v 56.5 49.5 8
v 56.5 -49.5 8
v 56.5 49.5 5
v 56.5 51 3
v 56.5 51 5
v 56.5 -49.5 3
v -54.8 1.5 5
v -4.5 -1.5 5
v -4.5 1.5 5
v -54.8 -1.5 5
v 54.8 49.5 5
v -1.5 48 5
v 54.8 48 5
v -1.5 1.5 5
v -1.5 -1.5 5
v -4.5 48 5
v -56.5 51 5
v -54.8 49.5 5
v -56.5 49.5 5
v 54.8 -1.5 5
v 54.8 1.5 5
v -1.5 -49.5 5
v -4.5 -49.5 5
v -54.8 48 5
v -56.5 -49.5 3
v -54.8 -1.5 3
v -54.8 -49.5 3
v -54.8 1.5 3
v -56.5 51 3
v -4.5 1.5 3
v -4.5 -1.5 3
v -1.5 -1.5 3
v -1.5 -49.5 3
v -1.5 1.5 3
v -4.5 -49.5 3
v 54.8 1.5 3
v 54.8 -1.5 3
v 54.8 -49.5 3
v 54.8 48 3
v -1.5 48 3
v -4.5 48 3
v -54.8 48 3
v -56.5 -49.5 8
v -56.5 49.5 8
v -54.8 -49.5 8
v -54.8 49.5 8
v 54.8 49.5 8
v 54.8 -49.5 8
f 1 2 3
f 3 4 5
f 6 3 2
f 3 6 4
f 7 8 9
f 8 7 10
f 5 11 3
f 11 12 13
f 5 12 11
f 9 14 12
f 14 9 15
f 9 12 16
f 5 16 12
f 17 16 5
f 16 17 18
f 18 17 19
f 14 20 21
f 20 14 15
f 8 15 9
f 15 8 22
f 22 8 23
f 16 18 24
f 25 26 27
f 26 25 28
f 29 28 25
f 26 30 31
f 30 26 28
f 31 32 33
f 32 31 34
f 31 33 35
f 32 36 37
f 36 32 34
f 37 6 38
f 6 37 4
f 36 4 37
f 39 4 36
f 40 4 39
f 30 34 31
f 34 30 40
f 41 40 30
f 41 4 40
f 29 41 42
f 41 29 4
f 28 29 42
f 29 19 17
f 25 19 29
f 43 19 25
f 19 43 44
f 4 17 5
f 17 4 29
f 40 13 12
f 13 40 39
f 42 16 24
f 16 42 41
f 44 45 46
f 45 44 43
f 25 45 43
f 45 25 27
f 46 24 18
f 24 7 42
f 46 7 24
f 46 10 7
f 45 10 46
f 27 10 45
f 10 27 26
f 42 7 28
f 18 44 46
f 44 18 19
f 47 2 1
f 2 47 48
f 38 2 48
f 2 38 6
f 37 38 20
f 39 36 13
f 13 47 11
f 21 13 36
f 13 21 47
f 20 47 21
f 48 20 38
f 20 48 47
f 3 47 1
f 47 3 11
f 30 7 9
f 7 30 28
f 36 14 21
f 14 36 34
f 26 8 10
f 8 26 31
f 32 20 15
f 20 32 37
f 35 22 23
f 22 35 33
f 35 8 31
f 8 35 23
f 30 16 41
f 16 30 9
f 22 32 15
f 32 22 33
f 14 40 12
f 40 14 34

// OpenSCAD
//
// ============================================================================
// SteamMachine UM790
// Project Phoenix
//
// Archivo : ribs.scad
// Versión : 8.0
//
// Nervios estructurales de la bandeja.
//
// ============================================================================

include <../../../00_parametros.scad>;

$fn = 64;


//=============================================================================
// NERVIO ENTRE DOS PUNTOS
//=============================================================================

module rib(x1, y1, x2, y2, width=rib_width, height=rib_height)
{

    dx = x2 - x1;
    dy = y2 - y1;

    len = sqrt(dx*dx + dy*dy);

    angle = atan2(dy, dx);

    translate([x1, y1, tray_thickness])

        rotate([0,0,angle])

            cube(
            [
                len,
                width,
                height
            ]);

}


//=============================================================================
// NERVIOS
//=============================================================================

module ribs()
{

    //---------------------------------------------------------
    // Horizontal superior
    //
    // PEDIDO POR EL USUARIO (2026-08-03, marcado en una captura de
    // su laminador): toca el disipador inferior del UM790 — altura
    // rebajada 3mm (5 → 2mm).
    //---------------------------------------------------------

    rib(
        -off_x,
         off_y-rib_width/2,

         off_x,
         off_y-rib_width/2,

         rib_width,
         rib_height - 3
    );


    //---------------------------------------------------------
    // Horizontal inferior — ELIMINADO (2026-08-03, petición del
    // usuario, marcado en una captura de su laminador): chocaba con
    // el conector USB interno y el pulsador de la placa UM790. Es el
    // mismo nervio que ya se había identificado por la proximidad
    // con el disipador tras el desplazamiento de los postes.
    //---------------------------------------------------------


    //---------------------------------------------------------
    // Vertical izquierdo
    //
    // FALLO CORREGIDO (2026-08-03, aviso del usuario: "mover tray y
    // posts para que no tapen los orificios de sujeción"): con el
    // ancho normal (3mm), el borde de este nervio quedaba a solo
    // 0,5mm del taladro de paso al pilar del suelo — el nervio, al
    // ser 5mm más alto que el taladro, tapaba parcialmente el acceso
    // en ángulo con el destornillador. Estrechado a 1,7mm y
    // reposicionado; sigue conectando con la isla (que llega hasta
    // mucho más allá), dejando ~2mm de separación real con el
    // taladro. Verificado con la geometría exportada, no solo
    // calculado — los valores exactos de ancho/desplazamiento de un
    // nervio rotado no son intuitivos.
    //---------------------------------------------------------

    translate([1.7,0,0])

    rib(
        -off_x,
        -off_y,

        -off_x,
         off_y,
         1.7
    );


    //---------------------------------------------------------
    // Vertical derecho
    //
    // FALLO CORREGIDO (2026-08-03, aviso del usuario: "mover tray y
    // posts para que no tapen los orificios de sujeción"): con el
    // ancho normal (3mm), el borde de este nervio quedaba a solo
    // 0,5mm del taladro de paso al pilar del suelo — el nervio, al
    // ser 5mm más alto que el taladro, tapaba parcialmente el acceso
    // en ángulo con el destornillador. Estrechado a 1,7mm; sigue
    // conectando con la isla (que llega hasta mucho más allá),
    // dejando ~1,8mm de separación real con el taladro. Verificado
    // con la geometría exportada, no solo calculado.
    //---------------------------------------------------------

    rib(
         off_x,
        -off_y,

         off_x,
         off_y,
         1.7
    );


    //---------------------------------------------------------
    // Cruz central horizontal
    //
    // PEDIDO POR EL USUARIO (2026-08-03, tras imprimir la bandeja
    // real): toca la parte inferior del UM790 — rebajada a la misma
    // altura que el horizontal superior (2mm), la pieza equivalente
    // más cercana a la parte trasera.
    //---------------------------------------------------------

    rib(
        -off_x,
        -rib_width/2,

         off_x,
        -rib_width/2,

         rib_width,
         rib_height - 3
    );


    //---------------------------------------------------------
    // Cruz central vertical
    //
    // PEDIDO POR EL USUARIO (2026-08-03, marcado en una captura de
    // su laminador): toca el disipador inferior del UM790 — altura
    // rebajada 3mm (5 → 2mm), igual que el horizontal superior.
    //---------------------------------------------------------

    translate([-rib_width/2,0,0])

    rib(
        0,
        -off_y,

        0,
         off_y,

         rib_width,
         rib_height - 3
    );

}


//=============================================================================
// PREVIEW
//=============================================================================

color("RoyalBlue")
ribs();
